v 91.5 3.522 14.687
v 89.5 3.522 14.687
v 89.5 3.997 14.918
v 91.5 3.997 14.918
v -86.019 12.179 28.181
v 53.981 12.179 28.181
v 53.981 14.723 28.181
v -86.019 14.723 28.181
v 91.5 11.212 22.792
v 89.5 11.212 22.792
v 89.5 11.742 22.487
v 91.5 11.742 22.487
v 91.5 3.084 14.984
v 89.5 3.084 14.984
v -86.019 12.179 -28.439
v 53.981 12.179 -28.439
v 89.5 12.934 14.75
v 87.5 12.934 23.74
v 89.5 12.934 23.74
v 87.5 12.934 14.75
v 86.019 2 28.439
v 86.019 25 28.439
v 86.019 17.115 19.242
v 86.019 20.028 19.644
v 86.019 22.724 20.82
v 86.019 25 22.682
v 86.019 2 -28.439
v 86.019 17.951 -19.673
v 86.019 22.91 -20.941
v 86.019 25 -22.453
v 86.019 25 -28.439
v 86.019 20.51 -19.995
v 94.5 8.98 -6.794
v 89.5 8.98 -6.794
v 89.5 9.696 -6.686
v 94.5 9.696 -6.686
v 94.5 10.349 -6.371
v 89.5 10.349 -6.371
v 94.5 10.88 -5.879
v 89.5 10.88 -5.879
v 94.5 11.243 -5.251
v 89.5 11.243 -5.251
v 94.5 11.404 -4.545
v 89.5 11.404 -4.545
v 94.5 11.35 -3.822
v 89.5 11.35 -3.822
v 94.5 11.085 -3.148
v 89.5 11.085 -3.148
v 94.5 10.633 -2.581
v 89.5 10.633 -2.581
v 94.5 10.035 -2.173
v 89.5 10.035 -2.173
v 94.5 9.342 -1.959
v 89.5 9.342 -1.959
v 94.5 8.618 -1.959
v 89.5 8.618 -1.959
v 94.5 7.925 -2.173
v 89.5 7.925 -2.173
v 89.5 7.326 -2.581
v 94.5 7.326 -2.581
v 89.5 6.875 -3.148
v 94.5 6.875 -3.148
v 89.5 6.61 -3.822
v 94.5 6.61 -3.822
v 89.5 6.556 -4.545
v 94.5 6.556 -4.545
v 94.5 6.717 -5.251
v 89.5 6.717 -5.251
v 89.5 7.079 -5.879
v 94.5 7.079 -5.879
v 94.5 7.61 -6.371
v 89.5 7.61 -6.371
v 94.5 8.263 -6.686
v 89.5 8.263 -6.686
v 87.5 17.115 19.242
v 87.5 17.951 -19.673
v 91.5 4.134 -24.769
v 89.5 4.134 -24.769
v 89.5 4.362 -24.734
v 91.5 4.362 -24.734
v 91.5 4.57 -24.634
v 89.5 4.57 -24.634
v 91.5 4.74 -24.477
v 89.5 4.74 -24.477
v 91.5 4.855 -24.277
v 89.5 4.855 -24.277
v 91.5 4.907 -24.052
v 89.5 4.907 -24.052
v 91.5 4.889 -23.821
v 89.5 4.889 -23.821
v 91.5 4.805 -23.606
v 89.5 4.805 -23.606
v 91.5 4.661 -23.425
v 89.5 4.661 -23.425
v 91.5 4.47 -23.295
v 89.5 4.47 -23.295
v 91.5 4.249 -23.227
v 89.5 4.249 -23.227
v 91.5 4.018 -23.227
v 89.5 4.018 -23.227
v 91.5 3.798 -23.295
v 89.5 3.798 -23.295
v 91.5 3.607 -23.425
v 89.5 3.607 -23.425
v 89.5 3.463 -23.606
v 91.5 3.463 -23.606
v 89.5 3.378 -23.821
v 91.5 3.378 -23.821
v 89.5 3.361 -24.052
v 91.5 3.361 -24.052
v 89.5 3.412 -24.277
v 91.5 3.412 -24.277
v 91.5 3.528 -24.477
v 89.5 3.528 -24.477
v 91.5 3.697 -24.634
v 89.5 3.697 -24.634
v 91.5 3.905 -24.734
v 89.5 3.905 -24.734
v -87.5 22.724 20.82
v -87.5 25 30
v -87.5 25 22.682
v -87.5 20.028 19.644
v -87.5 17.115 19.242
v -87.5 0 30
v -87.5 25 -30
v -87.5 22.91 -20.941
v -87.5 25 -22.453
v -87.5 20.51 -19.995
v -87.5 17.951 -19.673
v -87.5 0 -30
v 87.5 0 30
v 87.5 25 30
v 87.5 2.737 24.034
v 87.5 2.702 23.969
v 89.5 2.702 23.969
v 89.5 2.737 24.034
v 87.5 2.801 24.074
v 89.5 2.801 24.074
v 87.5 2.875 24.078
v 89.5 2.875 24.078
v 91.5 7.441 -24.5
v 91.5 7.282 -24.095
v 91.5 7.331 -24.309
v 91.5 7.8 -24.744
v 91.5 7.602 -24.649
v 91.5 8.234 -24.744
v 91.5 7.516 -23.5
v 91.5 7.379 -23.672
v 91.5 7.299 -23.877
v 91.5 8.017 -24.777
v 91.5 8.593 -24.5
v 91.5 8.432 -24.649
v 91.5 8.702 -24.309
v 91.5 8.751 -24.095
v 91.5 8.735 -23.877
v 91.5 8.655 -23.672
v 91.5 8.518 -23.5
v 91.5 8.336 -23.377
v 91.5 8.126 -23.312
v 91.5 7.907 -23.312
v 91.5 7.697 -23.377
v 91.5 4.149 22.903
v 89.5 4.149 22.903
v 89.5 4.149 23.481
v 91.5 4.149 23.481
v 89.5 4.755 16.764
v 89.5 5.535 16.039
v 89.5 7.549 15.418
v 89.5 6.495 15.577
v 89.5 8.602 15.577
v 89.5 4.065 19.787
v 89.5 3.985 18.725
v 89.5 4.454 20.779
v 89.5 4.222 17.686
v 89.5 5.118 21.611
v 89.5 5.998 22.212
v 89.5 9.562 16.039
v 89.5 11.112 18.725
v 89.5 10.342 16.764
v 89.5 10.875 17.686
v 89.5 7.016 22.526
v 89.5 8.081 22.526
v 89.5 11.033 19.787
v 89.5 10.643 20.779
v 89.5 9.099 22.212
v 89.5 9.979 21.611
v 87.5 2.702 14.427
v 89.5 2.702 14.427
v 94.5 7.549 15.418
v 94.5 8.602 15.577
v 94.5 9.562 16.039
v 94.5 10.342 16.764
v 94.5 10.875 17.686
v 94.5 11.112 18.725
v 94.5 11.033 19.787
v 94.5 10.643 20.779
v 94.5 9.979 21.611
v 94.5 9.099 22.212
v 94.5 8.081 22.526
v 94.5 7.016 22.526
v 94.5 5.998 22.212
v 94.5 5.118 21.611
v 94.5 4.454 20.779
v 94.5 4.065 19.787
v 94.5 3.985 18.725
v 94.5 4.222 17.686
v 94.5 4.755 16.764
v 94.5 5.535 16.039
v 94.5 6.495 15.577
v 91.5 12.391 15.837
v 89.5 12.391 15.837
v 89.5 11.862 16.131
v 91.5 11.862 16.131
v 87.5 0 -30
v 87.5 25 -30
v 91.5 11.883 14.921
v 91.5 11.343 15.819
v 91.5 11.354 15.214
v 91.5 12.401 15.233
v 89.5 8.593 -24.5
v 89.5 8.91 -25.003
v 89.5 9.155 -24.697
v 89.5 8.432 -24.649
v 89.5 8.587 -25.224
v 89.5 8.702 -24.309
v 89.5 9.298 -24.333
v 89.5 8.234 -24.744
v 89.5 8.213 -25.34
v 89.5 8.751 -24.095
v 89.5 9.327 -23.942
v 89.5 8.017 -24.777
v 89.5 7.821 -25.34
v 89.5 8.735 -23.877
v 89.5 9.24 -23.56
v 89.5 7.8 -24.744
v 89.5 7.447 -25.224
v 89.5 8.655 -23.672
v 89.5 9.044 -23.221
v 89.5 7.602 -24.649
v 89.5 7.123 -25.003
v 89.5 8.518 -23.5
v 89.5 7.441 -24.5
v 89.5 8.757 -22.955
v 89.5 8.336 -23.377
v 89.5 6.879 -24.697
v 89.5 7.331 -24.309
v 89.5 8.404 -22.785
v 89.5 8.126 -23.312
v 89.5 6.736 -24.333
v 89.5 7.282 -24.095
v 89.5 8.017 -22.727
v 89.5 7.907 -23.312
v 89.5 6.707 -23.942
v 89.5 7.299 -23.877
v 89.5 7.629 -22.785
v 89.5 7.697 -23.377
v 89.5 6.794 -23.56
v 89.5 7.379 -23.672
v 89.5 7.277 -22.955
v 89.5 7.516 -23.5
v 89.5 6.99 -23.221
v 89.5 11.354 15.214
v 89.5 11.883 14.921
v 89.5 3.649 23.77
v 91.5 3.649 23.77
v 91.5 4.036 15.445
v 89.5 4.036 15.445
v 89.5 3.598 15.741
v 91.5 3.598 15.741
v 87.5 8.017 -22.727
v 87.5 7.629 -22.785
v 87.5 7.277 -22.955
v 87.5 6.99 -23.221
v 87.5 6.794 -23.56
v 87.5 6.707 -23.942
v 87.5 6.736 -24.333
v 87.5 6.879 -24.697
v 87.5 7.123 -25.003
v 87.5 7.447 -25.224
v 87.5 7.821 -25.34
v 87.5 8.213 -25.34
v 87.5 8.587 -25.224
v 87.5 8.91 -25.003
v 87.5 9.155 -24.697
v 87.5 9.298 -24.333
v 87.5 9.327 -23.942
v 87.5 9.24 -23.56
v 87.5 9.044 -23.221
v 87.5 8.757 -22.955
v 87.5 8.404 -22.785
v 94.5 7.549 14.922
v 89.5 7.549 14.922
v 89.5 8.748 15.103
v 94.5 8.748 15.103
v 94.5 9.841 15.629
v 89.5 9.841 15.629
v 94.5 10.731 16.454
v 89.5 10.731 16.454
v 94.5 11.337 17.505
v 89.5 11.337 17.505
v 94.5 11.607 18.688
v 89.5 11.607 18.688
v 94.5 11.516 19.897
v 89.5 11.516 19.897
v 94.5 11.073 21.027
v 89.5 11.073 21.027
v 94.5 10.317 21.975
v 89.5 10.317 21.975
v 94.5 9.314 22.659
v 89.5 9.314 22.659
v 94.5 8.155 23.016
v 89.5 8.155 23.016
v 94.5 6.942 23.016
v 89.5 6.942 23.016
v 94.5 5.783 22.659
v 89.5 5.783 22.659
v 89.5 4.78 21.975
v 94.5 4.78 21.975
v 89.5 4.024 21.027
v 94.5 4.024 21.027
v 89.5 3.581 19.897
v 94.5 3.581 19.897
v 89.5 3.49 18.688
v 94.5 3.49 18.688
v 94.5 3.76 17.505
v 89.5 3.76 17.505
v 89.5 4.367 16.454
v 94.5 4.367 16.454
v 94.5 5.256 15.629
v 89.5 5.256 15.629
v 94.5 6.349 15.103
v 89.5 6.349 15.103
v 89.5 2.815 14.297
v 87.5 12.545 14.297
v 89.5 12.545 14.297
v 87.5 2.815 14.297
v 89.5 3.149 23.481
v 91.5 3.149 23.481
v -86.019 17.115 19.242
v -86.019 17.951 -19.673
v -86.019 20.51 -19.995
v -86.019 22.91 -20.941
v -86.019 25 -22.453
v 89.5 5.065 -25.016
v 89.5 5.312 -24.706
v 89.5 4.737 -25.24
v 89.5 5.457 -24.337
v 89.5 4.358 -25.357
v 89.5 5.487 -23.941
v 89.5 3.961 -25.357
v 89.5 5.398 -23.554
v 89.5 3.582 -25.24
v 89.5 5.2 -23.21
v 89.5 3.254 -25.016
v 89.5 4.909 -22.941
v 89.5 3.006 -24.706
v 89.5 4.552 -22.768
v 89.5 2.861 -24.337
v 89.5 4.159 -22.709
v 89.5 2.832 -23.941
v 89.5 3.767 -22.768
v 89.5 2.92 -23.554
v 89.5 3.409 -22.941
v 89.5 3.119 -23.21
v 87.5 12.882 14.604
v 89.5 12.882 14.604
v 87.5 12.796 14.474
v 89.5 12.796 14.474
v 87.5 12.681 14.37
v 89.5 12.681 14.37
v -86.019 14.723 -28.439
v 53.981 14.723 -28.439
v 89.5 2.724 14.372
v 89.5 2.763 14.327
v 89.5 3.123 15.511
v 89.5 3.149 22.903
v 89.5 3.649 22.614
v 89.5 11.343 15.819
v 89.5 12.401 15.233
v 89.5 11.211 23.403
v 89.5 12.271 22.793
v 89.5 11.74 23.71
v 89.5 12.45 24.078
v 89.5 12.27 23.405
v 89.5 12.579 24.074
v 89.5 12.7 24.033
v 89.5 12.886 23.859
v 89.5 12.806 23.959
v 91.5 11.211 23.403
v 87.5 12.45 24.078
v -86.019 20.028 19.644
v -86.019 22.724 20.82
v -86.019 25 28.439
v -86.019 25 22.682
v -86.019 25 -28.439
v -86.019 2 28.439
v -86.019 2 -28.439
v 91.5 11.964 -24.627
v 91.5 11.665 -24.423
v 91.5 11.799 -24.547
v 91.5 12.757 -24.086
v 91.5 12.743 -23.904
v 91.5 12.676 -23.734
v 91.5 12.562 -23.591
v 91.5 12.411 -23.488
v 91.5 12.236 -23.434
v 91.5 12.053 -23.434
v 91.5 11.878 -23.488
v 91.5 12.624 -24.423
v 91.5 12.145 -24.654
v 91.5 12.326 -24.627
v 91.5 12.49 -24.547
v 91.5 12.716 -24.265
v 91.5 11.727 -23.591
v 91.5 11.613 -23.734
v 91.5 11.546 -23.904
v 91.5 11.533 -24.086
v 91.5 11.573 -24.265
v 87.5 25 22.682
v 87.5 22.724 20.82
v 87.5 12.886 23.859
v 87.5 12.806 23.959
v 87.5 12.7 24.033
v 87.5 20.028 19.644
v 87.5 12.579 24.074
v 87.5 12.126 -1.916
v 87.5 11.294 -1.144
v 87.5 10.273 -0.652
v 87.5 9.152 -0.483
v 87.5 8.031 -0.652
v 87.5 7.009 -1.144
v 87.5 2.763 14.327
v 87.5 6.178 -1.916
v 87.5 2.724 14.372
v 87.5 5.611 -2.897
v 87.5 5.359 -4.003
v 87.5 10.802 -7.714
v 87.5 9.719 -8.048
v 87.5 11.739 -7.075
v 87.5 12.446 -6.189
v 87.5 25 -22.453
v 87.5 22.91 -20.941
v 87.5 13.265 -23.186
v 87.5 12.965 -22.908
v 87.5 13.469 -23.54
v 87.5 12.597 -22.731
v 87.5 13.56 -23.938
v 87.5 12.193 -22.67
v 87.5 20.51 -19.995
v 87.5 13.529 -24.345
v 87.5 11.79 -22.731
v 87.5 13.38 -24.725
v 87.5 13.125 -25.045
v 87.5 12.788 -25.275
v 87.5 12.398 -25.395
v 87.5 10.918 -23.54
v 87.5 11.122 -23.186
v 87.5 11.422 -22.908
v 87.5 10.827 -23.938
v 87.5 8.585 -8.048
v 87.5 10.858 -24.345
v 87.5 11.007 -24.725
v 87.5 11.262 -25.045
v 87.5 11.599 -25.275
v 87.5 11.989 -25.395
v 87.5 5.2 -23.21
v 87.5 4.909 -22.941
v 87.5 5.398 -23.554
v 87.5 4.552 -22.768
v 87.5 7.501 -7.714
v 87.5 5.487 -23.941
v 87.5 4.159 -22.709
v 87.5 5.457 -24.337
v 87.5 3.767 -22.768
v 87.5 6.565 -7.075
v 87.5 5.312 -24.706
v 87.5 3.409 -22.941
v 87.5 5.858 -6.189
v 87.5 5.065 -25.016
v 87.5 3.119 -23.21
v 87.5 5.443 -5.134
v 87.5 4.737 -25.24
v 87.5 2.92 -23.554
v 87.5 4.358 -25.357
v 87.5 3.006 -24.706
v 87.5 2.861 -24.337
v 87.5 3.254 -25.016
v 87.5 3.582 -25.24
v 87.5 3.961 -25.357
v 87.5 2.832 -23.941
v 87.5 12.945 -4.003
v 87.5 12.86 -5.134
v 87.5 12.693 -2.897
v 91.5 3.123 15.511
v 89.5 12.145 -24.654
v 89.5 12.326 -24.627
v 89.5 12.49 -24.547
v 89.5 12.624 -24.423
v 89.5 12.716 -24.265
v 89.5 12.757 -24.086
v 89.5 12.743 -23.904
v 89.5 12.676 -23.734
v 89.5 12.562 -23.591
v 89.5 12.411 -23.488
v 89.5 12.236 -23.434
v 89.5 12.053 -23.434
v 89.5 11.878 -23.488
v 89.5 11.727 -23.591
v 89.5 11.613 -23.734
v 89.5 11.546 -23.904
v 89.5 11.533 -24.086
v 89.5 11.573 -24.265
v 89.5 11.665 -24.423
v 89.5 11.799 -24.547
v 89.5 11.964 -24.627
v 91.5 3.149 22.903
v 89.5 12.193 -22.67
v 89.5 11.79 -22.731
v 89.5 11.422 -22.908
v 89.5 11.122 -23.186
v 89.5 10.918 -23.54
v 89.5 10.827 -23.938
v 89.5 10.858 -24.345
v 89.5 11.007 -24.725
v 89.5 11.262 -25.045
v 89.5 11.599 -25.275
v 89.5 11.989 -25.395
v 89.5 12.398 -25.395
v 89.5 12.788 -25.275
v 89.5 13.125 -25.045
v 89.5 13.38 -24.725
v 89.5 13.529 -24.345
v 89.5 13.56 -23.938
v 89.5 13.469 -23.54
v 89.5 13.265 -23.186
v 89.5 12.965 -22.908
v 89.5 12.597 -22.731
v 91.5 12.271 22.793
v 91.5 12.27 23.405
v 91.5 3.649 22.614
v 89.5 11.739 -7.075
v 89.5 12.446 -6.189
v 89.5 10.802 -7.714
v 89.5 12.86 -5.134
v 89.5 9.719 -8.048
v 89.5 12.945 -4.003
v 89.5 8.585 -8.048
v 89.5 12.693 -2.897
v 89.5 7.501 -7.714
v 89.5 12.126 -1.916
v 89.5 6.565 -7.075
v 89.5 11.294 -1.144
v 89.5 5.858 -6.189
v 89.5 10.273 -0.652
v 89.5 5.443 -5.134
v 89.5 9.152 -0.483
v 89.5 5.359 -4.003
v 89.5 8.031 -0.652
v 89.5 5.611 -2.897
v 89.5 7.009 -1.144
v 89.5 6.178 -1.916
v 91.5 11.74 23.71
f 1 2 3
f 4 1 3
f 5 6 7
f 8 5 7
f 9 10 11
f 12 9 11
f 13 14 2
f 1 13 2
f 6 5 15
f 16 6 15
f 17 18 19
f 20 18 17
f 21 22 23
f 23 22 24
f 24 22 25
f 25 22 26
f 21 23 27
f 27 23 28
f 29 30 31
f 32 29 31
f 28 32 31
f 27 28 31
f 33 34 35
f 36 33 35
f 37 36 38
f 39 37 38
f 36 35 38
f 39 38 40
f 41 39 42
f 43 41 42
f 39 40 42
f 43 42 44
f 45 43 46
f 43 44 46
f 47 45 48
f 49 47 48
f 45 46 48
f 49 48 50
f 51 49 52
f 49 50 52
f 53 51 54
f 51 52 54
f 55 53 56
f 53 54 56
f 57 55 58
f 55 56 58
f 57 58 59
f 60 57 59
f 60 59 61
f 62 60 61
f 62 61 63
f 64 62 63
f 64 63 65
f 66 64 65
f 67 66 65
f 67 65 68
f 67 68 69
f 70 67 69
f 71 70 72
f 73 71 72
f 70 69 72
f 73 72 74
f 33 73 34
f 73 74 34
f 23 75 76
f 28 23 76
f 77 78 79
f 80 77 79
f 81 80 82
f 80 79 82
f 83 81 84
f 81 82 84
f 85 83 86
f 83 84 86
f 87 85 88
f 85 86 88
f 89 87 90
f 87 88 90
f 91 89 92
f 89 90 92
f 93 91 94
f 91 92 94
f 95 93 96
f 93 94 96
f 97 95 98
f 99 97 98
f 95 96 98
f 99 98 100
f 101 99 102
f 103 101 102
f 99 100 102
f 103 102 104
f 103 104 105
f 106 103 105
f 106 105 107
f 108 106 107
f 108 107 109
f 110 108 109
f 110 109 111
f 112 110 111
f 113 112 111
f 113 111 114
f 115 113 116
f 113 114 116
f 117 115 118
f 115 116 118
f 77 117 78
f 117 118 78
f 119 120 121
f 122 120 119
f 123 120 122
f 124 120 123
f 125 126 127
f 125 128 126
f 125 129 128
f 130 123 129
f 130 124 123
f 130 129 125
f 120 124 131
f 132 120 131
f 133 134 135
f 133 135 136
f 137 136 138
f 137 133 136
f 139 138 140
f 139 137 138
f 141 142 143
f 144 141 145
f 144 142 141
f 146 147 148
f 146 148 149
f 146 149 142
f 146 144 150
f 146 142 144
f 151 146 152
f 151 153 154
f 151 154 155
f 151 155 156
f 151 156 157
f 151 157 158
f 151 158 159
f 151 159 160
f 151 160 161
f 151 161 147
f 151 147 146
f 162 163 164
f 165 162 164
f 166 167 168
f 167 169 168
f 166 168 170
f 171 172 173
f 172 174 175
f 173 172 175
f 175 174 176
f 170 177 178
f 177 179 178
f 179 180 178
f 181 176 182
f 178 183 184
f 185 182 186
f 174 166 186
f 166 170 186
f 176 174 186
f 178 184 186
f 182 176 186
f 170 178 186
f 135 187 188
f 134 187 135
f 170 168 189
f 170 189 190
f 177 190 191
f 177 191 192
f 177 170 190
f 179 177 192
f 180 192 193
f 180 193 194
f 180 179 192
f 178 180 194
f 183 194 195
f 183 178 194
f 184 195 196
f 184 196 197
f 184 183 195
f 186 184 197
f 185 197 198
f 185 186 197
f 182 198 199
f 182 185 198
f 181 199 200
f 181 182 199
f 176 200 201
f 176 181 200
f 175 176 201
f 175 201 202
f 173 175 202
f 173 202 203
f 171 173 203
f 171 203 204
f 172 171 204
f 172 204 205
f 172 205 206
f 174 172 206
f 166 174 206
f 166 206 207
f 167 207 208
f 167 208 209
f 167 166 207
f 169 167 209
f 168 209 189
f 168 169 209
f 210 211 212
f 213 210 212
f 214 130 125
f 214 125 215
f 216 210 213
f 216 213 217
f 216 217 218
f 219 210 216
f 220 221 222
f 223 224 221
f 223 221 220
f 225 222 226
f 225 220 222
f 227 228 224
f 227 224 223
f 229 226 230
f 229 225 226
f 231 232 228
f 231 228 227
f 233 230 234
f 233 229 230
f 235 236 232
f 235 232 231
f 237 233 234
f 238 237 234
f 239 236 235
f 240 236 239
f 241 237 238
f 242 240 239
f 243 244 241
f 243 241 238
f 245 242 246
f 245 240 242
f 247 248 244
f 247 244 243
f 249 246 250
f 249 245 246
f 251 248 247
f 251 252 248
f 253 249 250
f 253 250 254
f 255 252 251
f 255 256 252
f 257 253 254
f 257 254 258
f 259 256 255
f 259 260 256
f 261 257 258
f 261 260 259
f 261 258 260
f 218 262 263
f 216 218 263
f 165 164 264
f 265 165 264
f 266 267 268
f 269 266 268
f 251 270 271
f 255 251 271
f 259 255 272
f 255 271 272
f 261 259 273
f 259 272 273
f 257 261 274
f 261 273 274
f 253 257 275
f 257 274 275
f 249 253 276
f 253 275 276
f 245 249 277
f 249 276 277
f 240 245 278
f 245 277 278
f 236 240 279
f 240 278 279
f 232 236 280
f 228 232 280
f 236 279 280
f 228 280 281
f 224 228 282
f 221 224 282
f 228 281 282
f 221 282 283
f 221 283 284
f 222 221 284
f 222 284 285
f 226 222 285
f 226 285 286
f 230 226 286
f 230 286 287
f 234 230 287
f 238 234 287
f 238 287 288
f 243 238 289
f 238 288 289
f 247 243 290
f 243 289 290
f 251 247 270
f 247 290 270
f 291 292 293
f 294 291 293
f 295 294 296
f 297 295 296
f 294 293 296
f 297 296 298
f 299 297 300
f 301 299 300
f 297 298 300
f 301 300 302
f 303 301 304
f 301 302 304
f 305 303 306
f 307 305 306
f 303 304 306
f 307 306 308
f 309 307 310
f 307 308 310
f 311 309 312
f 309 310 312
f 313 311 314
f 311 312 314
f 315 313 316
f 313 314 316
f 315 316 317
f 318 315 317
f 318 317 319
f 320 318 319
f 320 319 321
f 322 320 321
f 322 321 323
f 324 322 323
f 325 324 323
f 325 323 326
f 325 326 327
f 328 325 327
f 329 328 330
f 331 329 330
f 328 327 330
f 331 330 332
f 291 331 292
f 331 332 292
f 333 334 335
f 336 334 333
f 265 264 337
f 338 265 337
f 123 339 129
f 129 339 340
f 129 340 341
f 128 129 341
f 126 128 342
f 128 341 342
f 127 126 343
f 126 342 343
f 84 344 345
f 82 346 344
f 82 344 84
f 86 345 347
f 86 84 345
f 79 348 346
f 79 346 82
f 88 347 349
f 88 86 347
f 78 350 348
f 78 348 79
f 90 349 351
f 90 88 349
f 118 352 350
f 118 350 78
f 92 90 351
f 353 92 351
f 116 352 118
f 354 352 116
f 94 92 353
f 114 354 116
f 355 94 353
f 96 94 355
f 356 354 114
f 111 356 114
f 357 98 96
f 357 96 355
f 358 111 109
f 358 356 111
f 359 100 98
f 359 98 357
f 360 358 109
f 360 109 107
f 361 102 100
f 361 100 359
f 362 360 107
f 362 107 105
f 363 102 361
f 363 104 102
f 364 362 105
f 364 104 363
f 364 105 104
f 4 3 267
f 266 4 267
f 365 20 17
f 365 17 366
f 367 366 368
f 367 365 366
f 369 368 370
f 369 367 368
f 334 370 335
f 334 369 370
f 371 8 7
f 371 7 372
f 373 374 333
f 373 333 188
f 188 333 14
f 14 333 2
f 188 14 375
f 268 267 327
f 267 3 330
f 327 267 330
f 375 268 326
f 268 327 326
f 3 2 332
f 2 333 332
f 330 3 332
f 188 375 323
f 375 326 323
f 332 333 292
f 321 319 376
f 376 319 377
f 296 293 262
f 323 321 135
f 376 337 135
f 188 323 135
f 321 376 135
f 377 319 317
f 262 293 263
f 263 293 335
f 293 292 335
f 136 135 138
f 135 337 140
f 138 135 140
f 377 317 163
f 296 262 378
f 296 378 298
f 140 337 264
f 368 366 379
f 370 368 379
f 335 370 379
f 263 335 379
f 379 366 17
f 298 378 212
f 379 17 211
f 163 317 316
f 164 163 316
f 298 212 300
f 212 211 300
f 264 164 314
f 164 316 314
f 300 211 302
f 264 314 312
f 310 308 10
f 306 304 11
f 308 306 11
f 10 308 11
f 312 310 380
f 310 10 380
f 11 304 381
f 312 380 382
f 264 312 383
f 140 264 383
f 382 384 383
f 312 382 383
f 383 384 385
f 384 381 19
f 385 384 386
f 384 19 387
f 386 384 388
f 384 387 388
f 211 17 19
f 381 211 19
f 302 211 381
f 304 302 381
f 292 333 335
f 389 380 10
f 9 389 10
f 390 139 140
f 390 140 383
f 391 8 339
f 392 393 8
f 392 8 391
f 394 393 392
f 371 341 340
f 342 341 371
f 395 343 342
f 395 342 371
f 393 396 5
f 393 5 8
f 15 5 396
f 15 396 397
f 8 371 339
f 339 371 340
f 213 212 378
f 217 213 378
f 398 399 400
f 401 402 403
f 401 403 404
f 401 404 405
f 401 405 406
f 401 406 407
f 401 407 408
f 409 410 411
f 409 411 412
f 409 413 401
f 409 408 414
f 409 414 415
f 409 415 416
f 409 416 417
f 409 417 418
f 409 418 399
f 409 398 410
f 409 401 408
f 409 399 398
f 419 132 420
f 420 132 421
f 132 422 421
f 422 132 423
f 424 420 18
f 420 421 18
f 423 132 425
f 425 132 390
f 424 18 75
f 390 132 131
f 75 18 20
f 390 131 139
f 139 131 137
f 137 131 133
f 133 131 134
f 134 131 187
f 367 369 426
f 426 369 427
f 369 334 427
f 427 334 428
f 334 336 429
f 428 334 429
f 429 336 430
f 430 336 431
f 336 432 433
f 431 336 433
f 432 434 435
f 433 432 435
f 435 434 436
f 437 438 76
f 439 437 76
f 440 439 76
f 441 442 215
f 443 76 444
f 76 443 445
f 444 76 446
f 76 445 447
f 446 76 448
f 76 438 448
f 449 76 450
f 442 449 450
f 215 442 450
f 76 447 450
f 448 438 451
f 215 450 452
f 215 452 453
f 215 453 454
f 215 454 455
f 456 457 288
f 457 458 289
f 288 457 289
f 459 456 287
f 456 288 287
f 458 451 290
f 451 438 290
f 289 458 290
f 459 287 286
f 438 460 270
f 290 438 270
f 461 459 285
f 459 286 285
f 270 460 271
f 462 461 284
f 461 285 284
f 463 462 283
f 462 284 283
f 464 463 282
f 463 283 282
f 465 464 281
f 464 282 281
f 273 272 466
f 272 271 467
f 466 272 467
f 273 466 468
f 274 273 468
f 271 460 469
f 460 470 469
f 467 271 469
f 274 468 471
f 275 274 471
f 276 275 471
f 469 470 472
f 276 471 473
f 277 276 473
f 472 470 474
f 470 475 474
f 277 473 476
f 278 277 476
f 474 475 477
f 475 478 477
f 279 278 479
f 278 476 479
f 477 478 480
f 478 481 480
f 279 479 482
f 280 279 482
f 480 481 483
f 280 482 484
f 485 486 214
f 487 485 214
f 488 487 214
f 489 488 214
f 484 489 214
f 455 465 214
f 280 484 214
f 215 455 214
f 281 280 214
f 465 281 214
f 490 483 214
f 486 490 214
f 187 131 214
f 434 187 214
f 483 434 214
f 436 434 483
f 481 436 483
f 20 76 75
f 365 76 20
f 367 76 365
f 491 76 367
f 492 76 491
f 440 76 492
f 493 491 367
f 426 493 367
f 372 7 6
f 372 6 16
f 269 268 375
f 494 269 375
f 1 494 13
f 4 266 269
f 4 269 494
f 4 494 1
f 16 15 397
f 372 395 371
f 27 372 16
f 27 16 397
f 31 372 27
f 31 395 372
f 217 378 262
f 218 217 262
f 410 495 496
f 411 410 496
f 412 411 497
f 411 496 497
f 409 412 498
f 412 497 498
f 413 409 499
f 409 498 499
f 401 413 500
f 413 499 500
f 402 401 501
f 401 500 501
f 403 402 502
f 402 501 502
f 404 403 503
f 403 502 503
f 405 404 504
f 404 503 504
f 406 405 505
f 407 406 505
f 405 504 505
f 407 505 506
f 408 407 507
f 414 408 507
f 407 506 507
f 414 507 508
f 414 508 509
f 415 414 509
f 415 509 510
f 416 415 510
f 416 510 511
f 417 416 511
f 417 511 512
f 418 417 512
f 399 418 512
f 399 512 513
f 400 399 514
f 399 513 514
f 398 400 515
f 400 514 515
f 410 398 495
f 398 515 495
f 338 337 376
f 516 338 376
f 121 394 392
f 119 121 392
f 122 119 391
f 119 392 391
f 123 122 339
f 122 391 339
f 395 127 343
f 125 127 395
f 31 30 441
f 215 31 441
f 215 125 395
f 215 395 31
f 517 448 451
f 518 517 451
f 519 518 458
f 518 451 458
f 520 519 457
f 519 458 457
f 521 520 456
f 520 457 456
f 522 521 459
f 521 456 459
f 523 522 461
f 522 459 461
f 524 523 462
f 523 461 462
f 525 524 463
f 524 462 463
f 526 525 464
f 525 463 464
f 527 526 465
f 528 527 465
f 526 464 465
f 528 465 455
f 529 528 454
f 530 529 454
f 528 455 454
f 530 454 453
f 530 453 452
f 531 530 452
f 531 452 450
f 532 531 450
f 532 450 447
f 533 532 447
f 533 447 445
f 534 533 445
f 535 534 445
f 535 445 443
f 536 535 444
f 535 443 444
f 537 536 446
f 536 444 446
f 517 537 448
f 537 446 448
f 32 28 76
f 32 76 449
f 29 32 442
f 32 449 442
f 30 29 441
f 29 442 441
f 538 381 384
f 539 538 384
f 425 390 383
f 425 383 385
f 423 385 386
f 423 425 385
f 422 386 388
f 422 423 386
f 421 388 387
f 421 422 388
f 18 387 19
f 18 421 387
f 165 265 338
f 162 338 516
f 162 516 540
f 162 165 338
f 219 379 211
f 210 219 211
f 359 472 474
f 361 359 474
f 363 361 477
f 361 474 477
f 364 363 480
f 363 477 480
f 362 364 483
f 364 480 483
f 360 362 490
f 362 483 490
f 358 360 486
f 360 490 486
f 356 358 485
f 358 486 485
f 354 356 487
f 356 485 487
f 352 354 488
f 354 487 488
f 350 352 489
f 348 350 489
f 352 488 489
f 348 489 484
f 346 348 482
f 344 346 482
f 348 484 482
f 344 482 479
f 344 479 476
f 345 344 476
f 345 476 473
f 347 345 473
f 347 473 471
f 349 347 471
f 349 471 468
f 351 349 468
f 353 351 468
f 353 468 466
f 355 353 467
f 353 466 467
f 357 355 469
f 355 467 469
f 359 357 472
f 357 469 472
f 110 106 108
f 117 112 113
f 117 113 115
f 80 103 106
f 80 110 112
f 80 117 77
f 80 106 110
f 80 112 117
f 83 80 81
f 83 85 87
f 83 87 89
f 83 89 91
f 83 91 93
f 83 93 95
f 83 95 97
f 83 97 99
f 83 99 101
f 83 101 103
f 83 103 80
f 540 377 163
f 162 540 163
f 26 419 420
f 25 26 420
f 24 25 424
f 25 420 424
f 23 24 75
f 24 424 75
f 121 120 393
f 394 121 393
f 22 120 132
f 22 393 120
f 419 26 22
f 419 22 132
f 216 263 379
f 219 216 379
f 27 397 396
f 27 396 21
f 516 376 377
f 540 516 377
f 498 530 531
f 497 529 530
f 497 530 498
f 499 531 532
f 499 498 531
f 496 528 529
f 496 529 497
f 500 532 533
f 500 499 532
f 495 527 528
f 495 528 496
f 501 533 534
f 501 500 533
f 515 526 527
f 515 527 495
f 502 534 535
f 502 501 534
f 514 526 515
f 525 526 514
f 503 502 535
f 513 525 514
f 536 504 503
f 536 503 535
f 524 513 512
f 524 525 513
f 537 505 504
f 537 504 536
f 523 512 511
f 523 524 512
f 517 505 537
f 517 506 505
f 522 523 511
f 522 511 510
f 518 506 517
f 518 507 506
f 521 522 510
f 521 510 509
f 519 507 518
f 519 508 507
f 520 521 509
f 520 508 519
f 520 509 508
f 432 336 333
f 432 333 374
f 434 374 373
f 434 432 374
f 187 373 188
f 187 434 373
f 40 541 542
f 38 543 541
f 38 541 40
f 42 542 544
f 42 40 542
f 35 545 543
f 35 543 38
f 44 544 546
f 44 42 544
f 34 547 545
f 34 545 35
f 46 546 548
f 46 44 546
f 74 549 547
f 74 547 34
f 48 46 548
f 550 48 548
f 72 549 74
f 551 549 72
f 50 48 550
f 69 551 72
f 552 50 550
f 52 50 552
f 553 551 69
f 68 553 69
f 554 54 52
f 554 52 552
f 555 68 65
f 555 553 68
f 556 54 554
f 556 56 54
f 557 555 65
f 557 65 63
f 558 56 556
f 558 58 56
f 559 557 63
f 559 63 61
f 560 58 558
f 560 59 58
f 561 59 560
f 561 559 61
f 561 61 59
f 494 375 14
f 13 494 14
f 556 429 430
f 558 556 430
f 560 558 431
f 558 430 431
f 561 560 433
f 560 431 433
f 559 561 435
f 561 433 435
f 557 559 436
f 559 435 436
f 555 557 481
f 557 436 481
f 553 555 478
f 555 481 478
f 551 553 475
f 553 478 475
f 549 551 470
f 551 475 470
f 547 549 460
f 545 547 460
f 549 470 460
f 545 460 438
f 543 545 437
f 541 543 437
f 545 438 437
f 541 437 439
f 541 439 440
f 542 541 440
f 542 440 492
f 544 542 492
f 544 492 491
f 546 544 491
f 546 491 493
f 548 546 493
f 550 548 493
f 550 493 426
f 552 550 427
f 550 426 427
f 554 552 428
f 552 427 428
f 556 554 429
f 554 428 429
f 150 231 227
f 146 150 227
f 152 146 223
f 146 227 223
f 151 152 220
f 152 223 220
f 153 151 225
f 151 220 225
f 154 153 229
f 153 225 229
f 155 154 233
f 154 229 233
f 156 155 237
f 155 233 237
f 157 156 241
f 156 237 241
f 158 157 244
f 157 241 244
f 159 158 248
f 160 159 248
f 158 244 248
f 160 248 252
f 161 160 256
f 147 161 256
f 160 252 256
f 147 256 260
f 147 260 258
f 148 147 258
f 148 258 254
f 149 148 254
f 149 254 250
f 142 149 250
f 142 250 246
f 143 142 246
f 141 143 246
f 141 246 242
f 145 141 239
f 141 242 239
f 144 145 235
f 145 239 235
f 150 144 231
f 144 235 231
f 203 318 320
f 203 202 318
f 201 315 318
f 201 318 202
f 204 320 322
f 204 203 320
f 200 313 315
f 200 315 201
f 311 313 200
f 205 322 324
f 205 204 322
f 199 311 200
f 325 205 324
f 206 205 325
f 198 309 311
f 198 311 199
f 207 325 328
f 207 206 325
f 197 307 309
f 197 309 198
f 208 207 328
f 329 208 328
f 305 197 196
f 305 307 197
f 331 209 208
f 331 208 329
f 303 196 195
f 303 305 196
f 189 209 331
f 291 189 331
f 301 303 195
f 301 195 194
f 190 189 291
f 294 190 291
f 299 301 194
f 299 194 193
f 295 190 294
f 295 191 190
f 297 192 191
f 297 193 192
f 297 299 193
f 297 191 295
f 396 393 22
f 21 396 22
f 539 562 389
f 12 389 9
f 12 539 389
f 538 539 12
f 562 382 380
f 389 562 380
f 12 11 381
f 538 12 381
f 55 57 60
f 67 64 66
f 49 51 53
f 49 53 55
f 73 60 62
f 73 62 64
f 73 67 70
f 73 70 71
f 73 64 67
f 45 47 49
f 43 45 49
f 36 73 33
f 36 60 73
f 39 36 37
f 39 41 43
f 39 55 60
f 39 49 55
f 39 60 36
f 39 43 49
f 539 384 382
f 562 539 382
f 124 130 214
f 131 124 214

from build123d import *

# Parameters (mm, degrees)
SKETCH1_W            = 175
SKETCH1_H            = 60
BOSS_EXTRUDE1_DEPTH  = 25
SKETCH2_W            = 172.037419054
SKETCH2_H            = 56.878309912
CUT_EXTRUDE2_DEPTH   = 23
CUT_EXTRUDE4_DEPTH   = 180.30421077
SKETCH5_W            = 56.619672169
SKETCH5_H            = 2.543260903
BOSS_EXTRUDE2_DEPTH  = 140
BOSS_EXTRUDE3_DEPTH  = 2
SKETCH7_R            = 4.069899946
SKETCH7_R_2          = 3.573578561
BOSS_EXTRUDE4_DEPTH  = 5
BOSS_EXTRUDE6_DEPTH  = 2
SKETCH9_R            = 3.803746222
BOSS_EXTRUDE7_DEPTH  = 2
SKETCH10_R           = 2.430826278
BOSS_EXTRUDE8_DEPTH  = 5
SKETCH11_R           = 1.370011297
SKETCH11_R_2         = 1.313817757
SKETCH11_R_3         = 1.331167219
BOSS_EXTRUDE9_DEPTH  = 2
SKETCH12_R           = 0.613636394
SKETCH12_R_2         = 0.736542168
SKETCH12_R_3         = 0.775004172
BOSS_EXTRUDE10_DEPTH = 2


with BuildPart() as part:
    # Sketch1 → Boss-Extrude1 (new body)
    with BuildSketch(Plane(origin=(0, 0, 0), x_dir=(1, 0, 0), z_dir=(0, 1, 0))):
        Rectangle(SKETCH1_W, SKETCH1_H)
    extrude(amount=BOSS_EXTRUDE1_DEPTH)

    # Sketch2 → Cut-Extrude2 (cut)
    with BuildSketch(Plane(origin=(0, 25, 0), x_dir=(1, 0, 0), z_dir=(0, 1, 0))):
        Rectangle(SKETCH2_W, SKETCH2_H)
    extrude(amount=-CUT_EXTRUDE2_DEPTH, mode=Mode.SUBTRACT)

    # Sketch3 → Cut-Extrude4 (cut, through all)
    with BuildSketch(Plane(origin=(87.5, 0, 0), x_dir=(0, 0, -1), z_dir=(1, 0, 0))):
        with BuildLine():
            ThreePointArc((-22.681609782, 25), (-20.139304377, 21.416181436), (-19.241971202, 17.114801954))
            Line((-19.241971202, 17.114801954), (19.672994279, 17.951296347))
            ThreePointArc((19.672994279, 17.951296347), (20.393002527, 21.739785058), (22.452628009, 25))
            Line((22.452628009, 25), (-22.681609782, 25))
        make_face()
    extrude(amount=-CUT_EXTRUDE4_DEPTH, mode=Mode.SUBTRACT)

    # Sketch5 → Boss-Extrude2 (add)
    with BuildSketch(Plane(origin=(-86.018709527, 0, 0), x_dir=(0, 0, -1), z_dir=(1, 0, 0))):
        with Locations((0.129318872, 13.450991009)):
            Rectangle(SKETCH5_W, SKETCH5_H)
    extrude(amount=BOSS_EXTRUDE2_DEPTH)

    # Sketch6 → Boss-Extrude3 (add)
    with BuildSketch(Plane(origin=(87.5, 0, 0), x_dir=(0, 0, -1), z_dir=(1, 0, 0))):
        with BuildLine():
            Line((-23.739887735, 12.934037749), (-14.749940356, 12.934037749))
            ThreePointArc((-14.749940356, 12.934037749), (-14.474436425, 12.796150035), (-14.296501276, 12.544645521))
            Line((-14.296501276, 12.544645521), (-14.296501276, 2.814596709))
            ThreePointArc((-14.296501276, 2.814596709), (-14.348088202, 2.742066754), (-14.427356599, 2.701590504))
            Line((-14.427356599, 2.701590504), (-23.96895697, 2.701590504))
            ThreePointArc((-23.96895697, 2.701590504), (-24.058326953, 2.766456684), (-24.077974584, 2.875124001))
            Line((-24.077974584, 2.875124001), (-24.077974584, 12.450209245))
            ThreePointArc((-24.077974584, 12.450209245), (-24.000062189, 12.755803504), (-23.739887735, 12.934037749))
        make_face()
    extrude(amount=BOSS_EXTRUDE3_DEPTH)

    # Sketch7 → Boss-Extrude4 (add)
    with BuildSketch(Plane(origin=(89.5, 0, 0), x_dir=(0, 0, -1), z_dir=(1, 0, 0))):
        with Locations((-18.991835841, 7.548541402)):
            Circle(SKETCH7_R)
        with Locations((-18.991835841, 7.548541402)):
            Circle(SKETCH7_R_2, mode=Mode.SUBTRACT)
    extrude(amount=BOSS_EXTRUDE4_DEPTH)

    # Sketch8 → Boss-Extrude6 (add)
    with BuildSketch(Plane(origin=(89.5, 0, 0), x_dir=(0, 0, -1), z_dir=(1, 0, 0))):
        Polygon((-22.791586736, 11.211896935), (-22.48659006, 11.74204685), (-22.793215015, 12.271256677), (-23.404836647, 12.27031659), (-23.709833324, 11.740166675), (-23.403208368, 11.210956848), align=None)
        Polygon((-15.214334729, 11.35367817), (-14.921128157, 11.882675416), (-15.232649924, 12.40109838), (-15.837378264, 12.390524097), (-16.130584836, 11.861526851), (-15.819063069, 11.343103888), align=None)
        Polygon((-22.614375311, 3.648960977), (-22.903289414, 4.149374881), (-23.481117618, 4.149374881), (-23.770031721, 3.648960977), (-23.481117618, 3.148547073), (-22.903289414, 3.148547073), align=None)
        Polygon((-14.98393783, 3.084271685), (-14.687192917, 3.521636864), (-14.917589816, 3.997308087), (-15.444731629, 4.035614131), (-15.741476542, 3.598248952), (-15.511079643, 3.122577729), align=None)
    extrude(amount=BOSS_EXTRUDE6_DEPTH)

    # Sketch9 → Boss-Extrude7 (add)
    with BuildSketch(Plane(origin=(87.5, 0, 0), x_dir=(0, 0, -1), z_dir=(1, 0, 0))):
        with Locations(Location((4.287117765, 9.151764618, 0), (0, 0, 180))):
            Circle(SKETCH9_R)
    extrude(amount=BOSS_EXTRUDE7_DEPTH)

    # Sketch10 → Boss-Extrude8 (add)
    with BuildSketch(Plane(origin=(89.5, 0, 0), x_dir=(0, 0, -1), z_dir=(1, 0, 0))):
        with Locations((4.363010591, 8.979818711)):
            Circle(SKETCH10_R)
    extrude(amount=BOSS_EXTRUDE8_DEPTH)

    # Sketch11 → Boss-Extrude9 (add)
    with BuildSketch(Plane(origin=(87.5, 0, 0), x_dir=(0, 0, -1), z_dir=(1, 0, 0))):
        with Locations(Location((24.040397356, 12.193405529, 0), (0, 0, 180))):
            Circle(SKETCH11_R)
        with Locations(Location((24.040397356, 8.016708701, 0), (0, 0, 180))):
            Circle(SKETCH11_R_2)
        with Locations(Location((24.040397356, 4.159285121, 0), (0, 0, 180))):
            Circle(SKETCH11_R_3)
    extrude(amount=BOSS_EXTRUDE9_DEPTH)

    # Sketch12 → Boss-Extrude10 (add)
    with BuildSketch(Plane(origin=(89.5, 0, 0), x_dir=(0, 0, -1), z_dir=(1, 0, 0))):
        with Locations((24.040397356, 12.144680604)):
            Circle(SKETCH12_R)
        with Locations((24.040397356, 8.016708701)):
            Circle(SKETCH12_R_2)
        with Locations((23.993599031, 4.133922204)):
            Circle(SKETCH12_R_3)
    extrude(amount=BOSS_EXTRUDE10_DEPTH)


solid = part.part
